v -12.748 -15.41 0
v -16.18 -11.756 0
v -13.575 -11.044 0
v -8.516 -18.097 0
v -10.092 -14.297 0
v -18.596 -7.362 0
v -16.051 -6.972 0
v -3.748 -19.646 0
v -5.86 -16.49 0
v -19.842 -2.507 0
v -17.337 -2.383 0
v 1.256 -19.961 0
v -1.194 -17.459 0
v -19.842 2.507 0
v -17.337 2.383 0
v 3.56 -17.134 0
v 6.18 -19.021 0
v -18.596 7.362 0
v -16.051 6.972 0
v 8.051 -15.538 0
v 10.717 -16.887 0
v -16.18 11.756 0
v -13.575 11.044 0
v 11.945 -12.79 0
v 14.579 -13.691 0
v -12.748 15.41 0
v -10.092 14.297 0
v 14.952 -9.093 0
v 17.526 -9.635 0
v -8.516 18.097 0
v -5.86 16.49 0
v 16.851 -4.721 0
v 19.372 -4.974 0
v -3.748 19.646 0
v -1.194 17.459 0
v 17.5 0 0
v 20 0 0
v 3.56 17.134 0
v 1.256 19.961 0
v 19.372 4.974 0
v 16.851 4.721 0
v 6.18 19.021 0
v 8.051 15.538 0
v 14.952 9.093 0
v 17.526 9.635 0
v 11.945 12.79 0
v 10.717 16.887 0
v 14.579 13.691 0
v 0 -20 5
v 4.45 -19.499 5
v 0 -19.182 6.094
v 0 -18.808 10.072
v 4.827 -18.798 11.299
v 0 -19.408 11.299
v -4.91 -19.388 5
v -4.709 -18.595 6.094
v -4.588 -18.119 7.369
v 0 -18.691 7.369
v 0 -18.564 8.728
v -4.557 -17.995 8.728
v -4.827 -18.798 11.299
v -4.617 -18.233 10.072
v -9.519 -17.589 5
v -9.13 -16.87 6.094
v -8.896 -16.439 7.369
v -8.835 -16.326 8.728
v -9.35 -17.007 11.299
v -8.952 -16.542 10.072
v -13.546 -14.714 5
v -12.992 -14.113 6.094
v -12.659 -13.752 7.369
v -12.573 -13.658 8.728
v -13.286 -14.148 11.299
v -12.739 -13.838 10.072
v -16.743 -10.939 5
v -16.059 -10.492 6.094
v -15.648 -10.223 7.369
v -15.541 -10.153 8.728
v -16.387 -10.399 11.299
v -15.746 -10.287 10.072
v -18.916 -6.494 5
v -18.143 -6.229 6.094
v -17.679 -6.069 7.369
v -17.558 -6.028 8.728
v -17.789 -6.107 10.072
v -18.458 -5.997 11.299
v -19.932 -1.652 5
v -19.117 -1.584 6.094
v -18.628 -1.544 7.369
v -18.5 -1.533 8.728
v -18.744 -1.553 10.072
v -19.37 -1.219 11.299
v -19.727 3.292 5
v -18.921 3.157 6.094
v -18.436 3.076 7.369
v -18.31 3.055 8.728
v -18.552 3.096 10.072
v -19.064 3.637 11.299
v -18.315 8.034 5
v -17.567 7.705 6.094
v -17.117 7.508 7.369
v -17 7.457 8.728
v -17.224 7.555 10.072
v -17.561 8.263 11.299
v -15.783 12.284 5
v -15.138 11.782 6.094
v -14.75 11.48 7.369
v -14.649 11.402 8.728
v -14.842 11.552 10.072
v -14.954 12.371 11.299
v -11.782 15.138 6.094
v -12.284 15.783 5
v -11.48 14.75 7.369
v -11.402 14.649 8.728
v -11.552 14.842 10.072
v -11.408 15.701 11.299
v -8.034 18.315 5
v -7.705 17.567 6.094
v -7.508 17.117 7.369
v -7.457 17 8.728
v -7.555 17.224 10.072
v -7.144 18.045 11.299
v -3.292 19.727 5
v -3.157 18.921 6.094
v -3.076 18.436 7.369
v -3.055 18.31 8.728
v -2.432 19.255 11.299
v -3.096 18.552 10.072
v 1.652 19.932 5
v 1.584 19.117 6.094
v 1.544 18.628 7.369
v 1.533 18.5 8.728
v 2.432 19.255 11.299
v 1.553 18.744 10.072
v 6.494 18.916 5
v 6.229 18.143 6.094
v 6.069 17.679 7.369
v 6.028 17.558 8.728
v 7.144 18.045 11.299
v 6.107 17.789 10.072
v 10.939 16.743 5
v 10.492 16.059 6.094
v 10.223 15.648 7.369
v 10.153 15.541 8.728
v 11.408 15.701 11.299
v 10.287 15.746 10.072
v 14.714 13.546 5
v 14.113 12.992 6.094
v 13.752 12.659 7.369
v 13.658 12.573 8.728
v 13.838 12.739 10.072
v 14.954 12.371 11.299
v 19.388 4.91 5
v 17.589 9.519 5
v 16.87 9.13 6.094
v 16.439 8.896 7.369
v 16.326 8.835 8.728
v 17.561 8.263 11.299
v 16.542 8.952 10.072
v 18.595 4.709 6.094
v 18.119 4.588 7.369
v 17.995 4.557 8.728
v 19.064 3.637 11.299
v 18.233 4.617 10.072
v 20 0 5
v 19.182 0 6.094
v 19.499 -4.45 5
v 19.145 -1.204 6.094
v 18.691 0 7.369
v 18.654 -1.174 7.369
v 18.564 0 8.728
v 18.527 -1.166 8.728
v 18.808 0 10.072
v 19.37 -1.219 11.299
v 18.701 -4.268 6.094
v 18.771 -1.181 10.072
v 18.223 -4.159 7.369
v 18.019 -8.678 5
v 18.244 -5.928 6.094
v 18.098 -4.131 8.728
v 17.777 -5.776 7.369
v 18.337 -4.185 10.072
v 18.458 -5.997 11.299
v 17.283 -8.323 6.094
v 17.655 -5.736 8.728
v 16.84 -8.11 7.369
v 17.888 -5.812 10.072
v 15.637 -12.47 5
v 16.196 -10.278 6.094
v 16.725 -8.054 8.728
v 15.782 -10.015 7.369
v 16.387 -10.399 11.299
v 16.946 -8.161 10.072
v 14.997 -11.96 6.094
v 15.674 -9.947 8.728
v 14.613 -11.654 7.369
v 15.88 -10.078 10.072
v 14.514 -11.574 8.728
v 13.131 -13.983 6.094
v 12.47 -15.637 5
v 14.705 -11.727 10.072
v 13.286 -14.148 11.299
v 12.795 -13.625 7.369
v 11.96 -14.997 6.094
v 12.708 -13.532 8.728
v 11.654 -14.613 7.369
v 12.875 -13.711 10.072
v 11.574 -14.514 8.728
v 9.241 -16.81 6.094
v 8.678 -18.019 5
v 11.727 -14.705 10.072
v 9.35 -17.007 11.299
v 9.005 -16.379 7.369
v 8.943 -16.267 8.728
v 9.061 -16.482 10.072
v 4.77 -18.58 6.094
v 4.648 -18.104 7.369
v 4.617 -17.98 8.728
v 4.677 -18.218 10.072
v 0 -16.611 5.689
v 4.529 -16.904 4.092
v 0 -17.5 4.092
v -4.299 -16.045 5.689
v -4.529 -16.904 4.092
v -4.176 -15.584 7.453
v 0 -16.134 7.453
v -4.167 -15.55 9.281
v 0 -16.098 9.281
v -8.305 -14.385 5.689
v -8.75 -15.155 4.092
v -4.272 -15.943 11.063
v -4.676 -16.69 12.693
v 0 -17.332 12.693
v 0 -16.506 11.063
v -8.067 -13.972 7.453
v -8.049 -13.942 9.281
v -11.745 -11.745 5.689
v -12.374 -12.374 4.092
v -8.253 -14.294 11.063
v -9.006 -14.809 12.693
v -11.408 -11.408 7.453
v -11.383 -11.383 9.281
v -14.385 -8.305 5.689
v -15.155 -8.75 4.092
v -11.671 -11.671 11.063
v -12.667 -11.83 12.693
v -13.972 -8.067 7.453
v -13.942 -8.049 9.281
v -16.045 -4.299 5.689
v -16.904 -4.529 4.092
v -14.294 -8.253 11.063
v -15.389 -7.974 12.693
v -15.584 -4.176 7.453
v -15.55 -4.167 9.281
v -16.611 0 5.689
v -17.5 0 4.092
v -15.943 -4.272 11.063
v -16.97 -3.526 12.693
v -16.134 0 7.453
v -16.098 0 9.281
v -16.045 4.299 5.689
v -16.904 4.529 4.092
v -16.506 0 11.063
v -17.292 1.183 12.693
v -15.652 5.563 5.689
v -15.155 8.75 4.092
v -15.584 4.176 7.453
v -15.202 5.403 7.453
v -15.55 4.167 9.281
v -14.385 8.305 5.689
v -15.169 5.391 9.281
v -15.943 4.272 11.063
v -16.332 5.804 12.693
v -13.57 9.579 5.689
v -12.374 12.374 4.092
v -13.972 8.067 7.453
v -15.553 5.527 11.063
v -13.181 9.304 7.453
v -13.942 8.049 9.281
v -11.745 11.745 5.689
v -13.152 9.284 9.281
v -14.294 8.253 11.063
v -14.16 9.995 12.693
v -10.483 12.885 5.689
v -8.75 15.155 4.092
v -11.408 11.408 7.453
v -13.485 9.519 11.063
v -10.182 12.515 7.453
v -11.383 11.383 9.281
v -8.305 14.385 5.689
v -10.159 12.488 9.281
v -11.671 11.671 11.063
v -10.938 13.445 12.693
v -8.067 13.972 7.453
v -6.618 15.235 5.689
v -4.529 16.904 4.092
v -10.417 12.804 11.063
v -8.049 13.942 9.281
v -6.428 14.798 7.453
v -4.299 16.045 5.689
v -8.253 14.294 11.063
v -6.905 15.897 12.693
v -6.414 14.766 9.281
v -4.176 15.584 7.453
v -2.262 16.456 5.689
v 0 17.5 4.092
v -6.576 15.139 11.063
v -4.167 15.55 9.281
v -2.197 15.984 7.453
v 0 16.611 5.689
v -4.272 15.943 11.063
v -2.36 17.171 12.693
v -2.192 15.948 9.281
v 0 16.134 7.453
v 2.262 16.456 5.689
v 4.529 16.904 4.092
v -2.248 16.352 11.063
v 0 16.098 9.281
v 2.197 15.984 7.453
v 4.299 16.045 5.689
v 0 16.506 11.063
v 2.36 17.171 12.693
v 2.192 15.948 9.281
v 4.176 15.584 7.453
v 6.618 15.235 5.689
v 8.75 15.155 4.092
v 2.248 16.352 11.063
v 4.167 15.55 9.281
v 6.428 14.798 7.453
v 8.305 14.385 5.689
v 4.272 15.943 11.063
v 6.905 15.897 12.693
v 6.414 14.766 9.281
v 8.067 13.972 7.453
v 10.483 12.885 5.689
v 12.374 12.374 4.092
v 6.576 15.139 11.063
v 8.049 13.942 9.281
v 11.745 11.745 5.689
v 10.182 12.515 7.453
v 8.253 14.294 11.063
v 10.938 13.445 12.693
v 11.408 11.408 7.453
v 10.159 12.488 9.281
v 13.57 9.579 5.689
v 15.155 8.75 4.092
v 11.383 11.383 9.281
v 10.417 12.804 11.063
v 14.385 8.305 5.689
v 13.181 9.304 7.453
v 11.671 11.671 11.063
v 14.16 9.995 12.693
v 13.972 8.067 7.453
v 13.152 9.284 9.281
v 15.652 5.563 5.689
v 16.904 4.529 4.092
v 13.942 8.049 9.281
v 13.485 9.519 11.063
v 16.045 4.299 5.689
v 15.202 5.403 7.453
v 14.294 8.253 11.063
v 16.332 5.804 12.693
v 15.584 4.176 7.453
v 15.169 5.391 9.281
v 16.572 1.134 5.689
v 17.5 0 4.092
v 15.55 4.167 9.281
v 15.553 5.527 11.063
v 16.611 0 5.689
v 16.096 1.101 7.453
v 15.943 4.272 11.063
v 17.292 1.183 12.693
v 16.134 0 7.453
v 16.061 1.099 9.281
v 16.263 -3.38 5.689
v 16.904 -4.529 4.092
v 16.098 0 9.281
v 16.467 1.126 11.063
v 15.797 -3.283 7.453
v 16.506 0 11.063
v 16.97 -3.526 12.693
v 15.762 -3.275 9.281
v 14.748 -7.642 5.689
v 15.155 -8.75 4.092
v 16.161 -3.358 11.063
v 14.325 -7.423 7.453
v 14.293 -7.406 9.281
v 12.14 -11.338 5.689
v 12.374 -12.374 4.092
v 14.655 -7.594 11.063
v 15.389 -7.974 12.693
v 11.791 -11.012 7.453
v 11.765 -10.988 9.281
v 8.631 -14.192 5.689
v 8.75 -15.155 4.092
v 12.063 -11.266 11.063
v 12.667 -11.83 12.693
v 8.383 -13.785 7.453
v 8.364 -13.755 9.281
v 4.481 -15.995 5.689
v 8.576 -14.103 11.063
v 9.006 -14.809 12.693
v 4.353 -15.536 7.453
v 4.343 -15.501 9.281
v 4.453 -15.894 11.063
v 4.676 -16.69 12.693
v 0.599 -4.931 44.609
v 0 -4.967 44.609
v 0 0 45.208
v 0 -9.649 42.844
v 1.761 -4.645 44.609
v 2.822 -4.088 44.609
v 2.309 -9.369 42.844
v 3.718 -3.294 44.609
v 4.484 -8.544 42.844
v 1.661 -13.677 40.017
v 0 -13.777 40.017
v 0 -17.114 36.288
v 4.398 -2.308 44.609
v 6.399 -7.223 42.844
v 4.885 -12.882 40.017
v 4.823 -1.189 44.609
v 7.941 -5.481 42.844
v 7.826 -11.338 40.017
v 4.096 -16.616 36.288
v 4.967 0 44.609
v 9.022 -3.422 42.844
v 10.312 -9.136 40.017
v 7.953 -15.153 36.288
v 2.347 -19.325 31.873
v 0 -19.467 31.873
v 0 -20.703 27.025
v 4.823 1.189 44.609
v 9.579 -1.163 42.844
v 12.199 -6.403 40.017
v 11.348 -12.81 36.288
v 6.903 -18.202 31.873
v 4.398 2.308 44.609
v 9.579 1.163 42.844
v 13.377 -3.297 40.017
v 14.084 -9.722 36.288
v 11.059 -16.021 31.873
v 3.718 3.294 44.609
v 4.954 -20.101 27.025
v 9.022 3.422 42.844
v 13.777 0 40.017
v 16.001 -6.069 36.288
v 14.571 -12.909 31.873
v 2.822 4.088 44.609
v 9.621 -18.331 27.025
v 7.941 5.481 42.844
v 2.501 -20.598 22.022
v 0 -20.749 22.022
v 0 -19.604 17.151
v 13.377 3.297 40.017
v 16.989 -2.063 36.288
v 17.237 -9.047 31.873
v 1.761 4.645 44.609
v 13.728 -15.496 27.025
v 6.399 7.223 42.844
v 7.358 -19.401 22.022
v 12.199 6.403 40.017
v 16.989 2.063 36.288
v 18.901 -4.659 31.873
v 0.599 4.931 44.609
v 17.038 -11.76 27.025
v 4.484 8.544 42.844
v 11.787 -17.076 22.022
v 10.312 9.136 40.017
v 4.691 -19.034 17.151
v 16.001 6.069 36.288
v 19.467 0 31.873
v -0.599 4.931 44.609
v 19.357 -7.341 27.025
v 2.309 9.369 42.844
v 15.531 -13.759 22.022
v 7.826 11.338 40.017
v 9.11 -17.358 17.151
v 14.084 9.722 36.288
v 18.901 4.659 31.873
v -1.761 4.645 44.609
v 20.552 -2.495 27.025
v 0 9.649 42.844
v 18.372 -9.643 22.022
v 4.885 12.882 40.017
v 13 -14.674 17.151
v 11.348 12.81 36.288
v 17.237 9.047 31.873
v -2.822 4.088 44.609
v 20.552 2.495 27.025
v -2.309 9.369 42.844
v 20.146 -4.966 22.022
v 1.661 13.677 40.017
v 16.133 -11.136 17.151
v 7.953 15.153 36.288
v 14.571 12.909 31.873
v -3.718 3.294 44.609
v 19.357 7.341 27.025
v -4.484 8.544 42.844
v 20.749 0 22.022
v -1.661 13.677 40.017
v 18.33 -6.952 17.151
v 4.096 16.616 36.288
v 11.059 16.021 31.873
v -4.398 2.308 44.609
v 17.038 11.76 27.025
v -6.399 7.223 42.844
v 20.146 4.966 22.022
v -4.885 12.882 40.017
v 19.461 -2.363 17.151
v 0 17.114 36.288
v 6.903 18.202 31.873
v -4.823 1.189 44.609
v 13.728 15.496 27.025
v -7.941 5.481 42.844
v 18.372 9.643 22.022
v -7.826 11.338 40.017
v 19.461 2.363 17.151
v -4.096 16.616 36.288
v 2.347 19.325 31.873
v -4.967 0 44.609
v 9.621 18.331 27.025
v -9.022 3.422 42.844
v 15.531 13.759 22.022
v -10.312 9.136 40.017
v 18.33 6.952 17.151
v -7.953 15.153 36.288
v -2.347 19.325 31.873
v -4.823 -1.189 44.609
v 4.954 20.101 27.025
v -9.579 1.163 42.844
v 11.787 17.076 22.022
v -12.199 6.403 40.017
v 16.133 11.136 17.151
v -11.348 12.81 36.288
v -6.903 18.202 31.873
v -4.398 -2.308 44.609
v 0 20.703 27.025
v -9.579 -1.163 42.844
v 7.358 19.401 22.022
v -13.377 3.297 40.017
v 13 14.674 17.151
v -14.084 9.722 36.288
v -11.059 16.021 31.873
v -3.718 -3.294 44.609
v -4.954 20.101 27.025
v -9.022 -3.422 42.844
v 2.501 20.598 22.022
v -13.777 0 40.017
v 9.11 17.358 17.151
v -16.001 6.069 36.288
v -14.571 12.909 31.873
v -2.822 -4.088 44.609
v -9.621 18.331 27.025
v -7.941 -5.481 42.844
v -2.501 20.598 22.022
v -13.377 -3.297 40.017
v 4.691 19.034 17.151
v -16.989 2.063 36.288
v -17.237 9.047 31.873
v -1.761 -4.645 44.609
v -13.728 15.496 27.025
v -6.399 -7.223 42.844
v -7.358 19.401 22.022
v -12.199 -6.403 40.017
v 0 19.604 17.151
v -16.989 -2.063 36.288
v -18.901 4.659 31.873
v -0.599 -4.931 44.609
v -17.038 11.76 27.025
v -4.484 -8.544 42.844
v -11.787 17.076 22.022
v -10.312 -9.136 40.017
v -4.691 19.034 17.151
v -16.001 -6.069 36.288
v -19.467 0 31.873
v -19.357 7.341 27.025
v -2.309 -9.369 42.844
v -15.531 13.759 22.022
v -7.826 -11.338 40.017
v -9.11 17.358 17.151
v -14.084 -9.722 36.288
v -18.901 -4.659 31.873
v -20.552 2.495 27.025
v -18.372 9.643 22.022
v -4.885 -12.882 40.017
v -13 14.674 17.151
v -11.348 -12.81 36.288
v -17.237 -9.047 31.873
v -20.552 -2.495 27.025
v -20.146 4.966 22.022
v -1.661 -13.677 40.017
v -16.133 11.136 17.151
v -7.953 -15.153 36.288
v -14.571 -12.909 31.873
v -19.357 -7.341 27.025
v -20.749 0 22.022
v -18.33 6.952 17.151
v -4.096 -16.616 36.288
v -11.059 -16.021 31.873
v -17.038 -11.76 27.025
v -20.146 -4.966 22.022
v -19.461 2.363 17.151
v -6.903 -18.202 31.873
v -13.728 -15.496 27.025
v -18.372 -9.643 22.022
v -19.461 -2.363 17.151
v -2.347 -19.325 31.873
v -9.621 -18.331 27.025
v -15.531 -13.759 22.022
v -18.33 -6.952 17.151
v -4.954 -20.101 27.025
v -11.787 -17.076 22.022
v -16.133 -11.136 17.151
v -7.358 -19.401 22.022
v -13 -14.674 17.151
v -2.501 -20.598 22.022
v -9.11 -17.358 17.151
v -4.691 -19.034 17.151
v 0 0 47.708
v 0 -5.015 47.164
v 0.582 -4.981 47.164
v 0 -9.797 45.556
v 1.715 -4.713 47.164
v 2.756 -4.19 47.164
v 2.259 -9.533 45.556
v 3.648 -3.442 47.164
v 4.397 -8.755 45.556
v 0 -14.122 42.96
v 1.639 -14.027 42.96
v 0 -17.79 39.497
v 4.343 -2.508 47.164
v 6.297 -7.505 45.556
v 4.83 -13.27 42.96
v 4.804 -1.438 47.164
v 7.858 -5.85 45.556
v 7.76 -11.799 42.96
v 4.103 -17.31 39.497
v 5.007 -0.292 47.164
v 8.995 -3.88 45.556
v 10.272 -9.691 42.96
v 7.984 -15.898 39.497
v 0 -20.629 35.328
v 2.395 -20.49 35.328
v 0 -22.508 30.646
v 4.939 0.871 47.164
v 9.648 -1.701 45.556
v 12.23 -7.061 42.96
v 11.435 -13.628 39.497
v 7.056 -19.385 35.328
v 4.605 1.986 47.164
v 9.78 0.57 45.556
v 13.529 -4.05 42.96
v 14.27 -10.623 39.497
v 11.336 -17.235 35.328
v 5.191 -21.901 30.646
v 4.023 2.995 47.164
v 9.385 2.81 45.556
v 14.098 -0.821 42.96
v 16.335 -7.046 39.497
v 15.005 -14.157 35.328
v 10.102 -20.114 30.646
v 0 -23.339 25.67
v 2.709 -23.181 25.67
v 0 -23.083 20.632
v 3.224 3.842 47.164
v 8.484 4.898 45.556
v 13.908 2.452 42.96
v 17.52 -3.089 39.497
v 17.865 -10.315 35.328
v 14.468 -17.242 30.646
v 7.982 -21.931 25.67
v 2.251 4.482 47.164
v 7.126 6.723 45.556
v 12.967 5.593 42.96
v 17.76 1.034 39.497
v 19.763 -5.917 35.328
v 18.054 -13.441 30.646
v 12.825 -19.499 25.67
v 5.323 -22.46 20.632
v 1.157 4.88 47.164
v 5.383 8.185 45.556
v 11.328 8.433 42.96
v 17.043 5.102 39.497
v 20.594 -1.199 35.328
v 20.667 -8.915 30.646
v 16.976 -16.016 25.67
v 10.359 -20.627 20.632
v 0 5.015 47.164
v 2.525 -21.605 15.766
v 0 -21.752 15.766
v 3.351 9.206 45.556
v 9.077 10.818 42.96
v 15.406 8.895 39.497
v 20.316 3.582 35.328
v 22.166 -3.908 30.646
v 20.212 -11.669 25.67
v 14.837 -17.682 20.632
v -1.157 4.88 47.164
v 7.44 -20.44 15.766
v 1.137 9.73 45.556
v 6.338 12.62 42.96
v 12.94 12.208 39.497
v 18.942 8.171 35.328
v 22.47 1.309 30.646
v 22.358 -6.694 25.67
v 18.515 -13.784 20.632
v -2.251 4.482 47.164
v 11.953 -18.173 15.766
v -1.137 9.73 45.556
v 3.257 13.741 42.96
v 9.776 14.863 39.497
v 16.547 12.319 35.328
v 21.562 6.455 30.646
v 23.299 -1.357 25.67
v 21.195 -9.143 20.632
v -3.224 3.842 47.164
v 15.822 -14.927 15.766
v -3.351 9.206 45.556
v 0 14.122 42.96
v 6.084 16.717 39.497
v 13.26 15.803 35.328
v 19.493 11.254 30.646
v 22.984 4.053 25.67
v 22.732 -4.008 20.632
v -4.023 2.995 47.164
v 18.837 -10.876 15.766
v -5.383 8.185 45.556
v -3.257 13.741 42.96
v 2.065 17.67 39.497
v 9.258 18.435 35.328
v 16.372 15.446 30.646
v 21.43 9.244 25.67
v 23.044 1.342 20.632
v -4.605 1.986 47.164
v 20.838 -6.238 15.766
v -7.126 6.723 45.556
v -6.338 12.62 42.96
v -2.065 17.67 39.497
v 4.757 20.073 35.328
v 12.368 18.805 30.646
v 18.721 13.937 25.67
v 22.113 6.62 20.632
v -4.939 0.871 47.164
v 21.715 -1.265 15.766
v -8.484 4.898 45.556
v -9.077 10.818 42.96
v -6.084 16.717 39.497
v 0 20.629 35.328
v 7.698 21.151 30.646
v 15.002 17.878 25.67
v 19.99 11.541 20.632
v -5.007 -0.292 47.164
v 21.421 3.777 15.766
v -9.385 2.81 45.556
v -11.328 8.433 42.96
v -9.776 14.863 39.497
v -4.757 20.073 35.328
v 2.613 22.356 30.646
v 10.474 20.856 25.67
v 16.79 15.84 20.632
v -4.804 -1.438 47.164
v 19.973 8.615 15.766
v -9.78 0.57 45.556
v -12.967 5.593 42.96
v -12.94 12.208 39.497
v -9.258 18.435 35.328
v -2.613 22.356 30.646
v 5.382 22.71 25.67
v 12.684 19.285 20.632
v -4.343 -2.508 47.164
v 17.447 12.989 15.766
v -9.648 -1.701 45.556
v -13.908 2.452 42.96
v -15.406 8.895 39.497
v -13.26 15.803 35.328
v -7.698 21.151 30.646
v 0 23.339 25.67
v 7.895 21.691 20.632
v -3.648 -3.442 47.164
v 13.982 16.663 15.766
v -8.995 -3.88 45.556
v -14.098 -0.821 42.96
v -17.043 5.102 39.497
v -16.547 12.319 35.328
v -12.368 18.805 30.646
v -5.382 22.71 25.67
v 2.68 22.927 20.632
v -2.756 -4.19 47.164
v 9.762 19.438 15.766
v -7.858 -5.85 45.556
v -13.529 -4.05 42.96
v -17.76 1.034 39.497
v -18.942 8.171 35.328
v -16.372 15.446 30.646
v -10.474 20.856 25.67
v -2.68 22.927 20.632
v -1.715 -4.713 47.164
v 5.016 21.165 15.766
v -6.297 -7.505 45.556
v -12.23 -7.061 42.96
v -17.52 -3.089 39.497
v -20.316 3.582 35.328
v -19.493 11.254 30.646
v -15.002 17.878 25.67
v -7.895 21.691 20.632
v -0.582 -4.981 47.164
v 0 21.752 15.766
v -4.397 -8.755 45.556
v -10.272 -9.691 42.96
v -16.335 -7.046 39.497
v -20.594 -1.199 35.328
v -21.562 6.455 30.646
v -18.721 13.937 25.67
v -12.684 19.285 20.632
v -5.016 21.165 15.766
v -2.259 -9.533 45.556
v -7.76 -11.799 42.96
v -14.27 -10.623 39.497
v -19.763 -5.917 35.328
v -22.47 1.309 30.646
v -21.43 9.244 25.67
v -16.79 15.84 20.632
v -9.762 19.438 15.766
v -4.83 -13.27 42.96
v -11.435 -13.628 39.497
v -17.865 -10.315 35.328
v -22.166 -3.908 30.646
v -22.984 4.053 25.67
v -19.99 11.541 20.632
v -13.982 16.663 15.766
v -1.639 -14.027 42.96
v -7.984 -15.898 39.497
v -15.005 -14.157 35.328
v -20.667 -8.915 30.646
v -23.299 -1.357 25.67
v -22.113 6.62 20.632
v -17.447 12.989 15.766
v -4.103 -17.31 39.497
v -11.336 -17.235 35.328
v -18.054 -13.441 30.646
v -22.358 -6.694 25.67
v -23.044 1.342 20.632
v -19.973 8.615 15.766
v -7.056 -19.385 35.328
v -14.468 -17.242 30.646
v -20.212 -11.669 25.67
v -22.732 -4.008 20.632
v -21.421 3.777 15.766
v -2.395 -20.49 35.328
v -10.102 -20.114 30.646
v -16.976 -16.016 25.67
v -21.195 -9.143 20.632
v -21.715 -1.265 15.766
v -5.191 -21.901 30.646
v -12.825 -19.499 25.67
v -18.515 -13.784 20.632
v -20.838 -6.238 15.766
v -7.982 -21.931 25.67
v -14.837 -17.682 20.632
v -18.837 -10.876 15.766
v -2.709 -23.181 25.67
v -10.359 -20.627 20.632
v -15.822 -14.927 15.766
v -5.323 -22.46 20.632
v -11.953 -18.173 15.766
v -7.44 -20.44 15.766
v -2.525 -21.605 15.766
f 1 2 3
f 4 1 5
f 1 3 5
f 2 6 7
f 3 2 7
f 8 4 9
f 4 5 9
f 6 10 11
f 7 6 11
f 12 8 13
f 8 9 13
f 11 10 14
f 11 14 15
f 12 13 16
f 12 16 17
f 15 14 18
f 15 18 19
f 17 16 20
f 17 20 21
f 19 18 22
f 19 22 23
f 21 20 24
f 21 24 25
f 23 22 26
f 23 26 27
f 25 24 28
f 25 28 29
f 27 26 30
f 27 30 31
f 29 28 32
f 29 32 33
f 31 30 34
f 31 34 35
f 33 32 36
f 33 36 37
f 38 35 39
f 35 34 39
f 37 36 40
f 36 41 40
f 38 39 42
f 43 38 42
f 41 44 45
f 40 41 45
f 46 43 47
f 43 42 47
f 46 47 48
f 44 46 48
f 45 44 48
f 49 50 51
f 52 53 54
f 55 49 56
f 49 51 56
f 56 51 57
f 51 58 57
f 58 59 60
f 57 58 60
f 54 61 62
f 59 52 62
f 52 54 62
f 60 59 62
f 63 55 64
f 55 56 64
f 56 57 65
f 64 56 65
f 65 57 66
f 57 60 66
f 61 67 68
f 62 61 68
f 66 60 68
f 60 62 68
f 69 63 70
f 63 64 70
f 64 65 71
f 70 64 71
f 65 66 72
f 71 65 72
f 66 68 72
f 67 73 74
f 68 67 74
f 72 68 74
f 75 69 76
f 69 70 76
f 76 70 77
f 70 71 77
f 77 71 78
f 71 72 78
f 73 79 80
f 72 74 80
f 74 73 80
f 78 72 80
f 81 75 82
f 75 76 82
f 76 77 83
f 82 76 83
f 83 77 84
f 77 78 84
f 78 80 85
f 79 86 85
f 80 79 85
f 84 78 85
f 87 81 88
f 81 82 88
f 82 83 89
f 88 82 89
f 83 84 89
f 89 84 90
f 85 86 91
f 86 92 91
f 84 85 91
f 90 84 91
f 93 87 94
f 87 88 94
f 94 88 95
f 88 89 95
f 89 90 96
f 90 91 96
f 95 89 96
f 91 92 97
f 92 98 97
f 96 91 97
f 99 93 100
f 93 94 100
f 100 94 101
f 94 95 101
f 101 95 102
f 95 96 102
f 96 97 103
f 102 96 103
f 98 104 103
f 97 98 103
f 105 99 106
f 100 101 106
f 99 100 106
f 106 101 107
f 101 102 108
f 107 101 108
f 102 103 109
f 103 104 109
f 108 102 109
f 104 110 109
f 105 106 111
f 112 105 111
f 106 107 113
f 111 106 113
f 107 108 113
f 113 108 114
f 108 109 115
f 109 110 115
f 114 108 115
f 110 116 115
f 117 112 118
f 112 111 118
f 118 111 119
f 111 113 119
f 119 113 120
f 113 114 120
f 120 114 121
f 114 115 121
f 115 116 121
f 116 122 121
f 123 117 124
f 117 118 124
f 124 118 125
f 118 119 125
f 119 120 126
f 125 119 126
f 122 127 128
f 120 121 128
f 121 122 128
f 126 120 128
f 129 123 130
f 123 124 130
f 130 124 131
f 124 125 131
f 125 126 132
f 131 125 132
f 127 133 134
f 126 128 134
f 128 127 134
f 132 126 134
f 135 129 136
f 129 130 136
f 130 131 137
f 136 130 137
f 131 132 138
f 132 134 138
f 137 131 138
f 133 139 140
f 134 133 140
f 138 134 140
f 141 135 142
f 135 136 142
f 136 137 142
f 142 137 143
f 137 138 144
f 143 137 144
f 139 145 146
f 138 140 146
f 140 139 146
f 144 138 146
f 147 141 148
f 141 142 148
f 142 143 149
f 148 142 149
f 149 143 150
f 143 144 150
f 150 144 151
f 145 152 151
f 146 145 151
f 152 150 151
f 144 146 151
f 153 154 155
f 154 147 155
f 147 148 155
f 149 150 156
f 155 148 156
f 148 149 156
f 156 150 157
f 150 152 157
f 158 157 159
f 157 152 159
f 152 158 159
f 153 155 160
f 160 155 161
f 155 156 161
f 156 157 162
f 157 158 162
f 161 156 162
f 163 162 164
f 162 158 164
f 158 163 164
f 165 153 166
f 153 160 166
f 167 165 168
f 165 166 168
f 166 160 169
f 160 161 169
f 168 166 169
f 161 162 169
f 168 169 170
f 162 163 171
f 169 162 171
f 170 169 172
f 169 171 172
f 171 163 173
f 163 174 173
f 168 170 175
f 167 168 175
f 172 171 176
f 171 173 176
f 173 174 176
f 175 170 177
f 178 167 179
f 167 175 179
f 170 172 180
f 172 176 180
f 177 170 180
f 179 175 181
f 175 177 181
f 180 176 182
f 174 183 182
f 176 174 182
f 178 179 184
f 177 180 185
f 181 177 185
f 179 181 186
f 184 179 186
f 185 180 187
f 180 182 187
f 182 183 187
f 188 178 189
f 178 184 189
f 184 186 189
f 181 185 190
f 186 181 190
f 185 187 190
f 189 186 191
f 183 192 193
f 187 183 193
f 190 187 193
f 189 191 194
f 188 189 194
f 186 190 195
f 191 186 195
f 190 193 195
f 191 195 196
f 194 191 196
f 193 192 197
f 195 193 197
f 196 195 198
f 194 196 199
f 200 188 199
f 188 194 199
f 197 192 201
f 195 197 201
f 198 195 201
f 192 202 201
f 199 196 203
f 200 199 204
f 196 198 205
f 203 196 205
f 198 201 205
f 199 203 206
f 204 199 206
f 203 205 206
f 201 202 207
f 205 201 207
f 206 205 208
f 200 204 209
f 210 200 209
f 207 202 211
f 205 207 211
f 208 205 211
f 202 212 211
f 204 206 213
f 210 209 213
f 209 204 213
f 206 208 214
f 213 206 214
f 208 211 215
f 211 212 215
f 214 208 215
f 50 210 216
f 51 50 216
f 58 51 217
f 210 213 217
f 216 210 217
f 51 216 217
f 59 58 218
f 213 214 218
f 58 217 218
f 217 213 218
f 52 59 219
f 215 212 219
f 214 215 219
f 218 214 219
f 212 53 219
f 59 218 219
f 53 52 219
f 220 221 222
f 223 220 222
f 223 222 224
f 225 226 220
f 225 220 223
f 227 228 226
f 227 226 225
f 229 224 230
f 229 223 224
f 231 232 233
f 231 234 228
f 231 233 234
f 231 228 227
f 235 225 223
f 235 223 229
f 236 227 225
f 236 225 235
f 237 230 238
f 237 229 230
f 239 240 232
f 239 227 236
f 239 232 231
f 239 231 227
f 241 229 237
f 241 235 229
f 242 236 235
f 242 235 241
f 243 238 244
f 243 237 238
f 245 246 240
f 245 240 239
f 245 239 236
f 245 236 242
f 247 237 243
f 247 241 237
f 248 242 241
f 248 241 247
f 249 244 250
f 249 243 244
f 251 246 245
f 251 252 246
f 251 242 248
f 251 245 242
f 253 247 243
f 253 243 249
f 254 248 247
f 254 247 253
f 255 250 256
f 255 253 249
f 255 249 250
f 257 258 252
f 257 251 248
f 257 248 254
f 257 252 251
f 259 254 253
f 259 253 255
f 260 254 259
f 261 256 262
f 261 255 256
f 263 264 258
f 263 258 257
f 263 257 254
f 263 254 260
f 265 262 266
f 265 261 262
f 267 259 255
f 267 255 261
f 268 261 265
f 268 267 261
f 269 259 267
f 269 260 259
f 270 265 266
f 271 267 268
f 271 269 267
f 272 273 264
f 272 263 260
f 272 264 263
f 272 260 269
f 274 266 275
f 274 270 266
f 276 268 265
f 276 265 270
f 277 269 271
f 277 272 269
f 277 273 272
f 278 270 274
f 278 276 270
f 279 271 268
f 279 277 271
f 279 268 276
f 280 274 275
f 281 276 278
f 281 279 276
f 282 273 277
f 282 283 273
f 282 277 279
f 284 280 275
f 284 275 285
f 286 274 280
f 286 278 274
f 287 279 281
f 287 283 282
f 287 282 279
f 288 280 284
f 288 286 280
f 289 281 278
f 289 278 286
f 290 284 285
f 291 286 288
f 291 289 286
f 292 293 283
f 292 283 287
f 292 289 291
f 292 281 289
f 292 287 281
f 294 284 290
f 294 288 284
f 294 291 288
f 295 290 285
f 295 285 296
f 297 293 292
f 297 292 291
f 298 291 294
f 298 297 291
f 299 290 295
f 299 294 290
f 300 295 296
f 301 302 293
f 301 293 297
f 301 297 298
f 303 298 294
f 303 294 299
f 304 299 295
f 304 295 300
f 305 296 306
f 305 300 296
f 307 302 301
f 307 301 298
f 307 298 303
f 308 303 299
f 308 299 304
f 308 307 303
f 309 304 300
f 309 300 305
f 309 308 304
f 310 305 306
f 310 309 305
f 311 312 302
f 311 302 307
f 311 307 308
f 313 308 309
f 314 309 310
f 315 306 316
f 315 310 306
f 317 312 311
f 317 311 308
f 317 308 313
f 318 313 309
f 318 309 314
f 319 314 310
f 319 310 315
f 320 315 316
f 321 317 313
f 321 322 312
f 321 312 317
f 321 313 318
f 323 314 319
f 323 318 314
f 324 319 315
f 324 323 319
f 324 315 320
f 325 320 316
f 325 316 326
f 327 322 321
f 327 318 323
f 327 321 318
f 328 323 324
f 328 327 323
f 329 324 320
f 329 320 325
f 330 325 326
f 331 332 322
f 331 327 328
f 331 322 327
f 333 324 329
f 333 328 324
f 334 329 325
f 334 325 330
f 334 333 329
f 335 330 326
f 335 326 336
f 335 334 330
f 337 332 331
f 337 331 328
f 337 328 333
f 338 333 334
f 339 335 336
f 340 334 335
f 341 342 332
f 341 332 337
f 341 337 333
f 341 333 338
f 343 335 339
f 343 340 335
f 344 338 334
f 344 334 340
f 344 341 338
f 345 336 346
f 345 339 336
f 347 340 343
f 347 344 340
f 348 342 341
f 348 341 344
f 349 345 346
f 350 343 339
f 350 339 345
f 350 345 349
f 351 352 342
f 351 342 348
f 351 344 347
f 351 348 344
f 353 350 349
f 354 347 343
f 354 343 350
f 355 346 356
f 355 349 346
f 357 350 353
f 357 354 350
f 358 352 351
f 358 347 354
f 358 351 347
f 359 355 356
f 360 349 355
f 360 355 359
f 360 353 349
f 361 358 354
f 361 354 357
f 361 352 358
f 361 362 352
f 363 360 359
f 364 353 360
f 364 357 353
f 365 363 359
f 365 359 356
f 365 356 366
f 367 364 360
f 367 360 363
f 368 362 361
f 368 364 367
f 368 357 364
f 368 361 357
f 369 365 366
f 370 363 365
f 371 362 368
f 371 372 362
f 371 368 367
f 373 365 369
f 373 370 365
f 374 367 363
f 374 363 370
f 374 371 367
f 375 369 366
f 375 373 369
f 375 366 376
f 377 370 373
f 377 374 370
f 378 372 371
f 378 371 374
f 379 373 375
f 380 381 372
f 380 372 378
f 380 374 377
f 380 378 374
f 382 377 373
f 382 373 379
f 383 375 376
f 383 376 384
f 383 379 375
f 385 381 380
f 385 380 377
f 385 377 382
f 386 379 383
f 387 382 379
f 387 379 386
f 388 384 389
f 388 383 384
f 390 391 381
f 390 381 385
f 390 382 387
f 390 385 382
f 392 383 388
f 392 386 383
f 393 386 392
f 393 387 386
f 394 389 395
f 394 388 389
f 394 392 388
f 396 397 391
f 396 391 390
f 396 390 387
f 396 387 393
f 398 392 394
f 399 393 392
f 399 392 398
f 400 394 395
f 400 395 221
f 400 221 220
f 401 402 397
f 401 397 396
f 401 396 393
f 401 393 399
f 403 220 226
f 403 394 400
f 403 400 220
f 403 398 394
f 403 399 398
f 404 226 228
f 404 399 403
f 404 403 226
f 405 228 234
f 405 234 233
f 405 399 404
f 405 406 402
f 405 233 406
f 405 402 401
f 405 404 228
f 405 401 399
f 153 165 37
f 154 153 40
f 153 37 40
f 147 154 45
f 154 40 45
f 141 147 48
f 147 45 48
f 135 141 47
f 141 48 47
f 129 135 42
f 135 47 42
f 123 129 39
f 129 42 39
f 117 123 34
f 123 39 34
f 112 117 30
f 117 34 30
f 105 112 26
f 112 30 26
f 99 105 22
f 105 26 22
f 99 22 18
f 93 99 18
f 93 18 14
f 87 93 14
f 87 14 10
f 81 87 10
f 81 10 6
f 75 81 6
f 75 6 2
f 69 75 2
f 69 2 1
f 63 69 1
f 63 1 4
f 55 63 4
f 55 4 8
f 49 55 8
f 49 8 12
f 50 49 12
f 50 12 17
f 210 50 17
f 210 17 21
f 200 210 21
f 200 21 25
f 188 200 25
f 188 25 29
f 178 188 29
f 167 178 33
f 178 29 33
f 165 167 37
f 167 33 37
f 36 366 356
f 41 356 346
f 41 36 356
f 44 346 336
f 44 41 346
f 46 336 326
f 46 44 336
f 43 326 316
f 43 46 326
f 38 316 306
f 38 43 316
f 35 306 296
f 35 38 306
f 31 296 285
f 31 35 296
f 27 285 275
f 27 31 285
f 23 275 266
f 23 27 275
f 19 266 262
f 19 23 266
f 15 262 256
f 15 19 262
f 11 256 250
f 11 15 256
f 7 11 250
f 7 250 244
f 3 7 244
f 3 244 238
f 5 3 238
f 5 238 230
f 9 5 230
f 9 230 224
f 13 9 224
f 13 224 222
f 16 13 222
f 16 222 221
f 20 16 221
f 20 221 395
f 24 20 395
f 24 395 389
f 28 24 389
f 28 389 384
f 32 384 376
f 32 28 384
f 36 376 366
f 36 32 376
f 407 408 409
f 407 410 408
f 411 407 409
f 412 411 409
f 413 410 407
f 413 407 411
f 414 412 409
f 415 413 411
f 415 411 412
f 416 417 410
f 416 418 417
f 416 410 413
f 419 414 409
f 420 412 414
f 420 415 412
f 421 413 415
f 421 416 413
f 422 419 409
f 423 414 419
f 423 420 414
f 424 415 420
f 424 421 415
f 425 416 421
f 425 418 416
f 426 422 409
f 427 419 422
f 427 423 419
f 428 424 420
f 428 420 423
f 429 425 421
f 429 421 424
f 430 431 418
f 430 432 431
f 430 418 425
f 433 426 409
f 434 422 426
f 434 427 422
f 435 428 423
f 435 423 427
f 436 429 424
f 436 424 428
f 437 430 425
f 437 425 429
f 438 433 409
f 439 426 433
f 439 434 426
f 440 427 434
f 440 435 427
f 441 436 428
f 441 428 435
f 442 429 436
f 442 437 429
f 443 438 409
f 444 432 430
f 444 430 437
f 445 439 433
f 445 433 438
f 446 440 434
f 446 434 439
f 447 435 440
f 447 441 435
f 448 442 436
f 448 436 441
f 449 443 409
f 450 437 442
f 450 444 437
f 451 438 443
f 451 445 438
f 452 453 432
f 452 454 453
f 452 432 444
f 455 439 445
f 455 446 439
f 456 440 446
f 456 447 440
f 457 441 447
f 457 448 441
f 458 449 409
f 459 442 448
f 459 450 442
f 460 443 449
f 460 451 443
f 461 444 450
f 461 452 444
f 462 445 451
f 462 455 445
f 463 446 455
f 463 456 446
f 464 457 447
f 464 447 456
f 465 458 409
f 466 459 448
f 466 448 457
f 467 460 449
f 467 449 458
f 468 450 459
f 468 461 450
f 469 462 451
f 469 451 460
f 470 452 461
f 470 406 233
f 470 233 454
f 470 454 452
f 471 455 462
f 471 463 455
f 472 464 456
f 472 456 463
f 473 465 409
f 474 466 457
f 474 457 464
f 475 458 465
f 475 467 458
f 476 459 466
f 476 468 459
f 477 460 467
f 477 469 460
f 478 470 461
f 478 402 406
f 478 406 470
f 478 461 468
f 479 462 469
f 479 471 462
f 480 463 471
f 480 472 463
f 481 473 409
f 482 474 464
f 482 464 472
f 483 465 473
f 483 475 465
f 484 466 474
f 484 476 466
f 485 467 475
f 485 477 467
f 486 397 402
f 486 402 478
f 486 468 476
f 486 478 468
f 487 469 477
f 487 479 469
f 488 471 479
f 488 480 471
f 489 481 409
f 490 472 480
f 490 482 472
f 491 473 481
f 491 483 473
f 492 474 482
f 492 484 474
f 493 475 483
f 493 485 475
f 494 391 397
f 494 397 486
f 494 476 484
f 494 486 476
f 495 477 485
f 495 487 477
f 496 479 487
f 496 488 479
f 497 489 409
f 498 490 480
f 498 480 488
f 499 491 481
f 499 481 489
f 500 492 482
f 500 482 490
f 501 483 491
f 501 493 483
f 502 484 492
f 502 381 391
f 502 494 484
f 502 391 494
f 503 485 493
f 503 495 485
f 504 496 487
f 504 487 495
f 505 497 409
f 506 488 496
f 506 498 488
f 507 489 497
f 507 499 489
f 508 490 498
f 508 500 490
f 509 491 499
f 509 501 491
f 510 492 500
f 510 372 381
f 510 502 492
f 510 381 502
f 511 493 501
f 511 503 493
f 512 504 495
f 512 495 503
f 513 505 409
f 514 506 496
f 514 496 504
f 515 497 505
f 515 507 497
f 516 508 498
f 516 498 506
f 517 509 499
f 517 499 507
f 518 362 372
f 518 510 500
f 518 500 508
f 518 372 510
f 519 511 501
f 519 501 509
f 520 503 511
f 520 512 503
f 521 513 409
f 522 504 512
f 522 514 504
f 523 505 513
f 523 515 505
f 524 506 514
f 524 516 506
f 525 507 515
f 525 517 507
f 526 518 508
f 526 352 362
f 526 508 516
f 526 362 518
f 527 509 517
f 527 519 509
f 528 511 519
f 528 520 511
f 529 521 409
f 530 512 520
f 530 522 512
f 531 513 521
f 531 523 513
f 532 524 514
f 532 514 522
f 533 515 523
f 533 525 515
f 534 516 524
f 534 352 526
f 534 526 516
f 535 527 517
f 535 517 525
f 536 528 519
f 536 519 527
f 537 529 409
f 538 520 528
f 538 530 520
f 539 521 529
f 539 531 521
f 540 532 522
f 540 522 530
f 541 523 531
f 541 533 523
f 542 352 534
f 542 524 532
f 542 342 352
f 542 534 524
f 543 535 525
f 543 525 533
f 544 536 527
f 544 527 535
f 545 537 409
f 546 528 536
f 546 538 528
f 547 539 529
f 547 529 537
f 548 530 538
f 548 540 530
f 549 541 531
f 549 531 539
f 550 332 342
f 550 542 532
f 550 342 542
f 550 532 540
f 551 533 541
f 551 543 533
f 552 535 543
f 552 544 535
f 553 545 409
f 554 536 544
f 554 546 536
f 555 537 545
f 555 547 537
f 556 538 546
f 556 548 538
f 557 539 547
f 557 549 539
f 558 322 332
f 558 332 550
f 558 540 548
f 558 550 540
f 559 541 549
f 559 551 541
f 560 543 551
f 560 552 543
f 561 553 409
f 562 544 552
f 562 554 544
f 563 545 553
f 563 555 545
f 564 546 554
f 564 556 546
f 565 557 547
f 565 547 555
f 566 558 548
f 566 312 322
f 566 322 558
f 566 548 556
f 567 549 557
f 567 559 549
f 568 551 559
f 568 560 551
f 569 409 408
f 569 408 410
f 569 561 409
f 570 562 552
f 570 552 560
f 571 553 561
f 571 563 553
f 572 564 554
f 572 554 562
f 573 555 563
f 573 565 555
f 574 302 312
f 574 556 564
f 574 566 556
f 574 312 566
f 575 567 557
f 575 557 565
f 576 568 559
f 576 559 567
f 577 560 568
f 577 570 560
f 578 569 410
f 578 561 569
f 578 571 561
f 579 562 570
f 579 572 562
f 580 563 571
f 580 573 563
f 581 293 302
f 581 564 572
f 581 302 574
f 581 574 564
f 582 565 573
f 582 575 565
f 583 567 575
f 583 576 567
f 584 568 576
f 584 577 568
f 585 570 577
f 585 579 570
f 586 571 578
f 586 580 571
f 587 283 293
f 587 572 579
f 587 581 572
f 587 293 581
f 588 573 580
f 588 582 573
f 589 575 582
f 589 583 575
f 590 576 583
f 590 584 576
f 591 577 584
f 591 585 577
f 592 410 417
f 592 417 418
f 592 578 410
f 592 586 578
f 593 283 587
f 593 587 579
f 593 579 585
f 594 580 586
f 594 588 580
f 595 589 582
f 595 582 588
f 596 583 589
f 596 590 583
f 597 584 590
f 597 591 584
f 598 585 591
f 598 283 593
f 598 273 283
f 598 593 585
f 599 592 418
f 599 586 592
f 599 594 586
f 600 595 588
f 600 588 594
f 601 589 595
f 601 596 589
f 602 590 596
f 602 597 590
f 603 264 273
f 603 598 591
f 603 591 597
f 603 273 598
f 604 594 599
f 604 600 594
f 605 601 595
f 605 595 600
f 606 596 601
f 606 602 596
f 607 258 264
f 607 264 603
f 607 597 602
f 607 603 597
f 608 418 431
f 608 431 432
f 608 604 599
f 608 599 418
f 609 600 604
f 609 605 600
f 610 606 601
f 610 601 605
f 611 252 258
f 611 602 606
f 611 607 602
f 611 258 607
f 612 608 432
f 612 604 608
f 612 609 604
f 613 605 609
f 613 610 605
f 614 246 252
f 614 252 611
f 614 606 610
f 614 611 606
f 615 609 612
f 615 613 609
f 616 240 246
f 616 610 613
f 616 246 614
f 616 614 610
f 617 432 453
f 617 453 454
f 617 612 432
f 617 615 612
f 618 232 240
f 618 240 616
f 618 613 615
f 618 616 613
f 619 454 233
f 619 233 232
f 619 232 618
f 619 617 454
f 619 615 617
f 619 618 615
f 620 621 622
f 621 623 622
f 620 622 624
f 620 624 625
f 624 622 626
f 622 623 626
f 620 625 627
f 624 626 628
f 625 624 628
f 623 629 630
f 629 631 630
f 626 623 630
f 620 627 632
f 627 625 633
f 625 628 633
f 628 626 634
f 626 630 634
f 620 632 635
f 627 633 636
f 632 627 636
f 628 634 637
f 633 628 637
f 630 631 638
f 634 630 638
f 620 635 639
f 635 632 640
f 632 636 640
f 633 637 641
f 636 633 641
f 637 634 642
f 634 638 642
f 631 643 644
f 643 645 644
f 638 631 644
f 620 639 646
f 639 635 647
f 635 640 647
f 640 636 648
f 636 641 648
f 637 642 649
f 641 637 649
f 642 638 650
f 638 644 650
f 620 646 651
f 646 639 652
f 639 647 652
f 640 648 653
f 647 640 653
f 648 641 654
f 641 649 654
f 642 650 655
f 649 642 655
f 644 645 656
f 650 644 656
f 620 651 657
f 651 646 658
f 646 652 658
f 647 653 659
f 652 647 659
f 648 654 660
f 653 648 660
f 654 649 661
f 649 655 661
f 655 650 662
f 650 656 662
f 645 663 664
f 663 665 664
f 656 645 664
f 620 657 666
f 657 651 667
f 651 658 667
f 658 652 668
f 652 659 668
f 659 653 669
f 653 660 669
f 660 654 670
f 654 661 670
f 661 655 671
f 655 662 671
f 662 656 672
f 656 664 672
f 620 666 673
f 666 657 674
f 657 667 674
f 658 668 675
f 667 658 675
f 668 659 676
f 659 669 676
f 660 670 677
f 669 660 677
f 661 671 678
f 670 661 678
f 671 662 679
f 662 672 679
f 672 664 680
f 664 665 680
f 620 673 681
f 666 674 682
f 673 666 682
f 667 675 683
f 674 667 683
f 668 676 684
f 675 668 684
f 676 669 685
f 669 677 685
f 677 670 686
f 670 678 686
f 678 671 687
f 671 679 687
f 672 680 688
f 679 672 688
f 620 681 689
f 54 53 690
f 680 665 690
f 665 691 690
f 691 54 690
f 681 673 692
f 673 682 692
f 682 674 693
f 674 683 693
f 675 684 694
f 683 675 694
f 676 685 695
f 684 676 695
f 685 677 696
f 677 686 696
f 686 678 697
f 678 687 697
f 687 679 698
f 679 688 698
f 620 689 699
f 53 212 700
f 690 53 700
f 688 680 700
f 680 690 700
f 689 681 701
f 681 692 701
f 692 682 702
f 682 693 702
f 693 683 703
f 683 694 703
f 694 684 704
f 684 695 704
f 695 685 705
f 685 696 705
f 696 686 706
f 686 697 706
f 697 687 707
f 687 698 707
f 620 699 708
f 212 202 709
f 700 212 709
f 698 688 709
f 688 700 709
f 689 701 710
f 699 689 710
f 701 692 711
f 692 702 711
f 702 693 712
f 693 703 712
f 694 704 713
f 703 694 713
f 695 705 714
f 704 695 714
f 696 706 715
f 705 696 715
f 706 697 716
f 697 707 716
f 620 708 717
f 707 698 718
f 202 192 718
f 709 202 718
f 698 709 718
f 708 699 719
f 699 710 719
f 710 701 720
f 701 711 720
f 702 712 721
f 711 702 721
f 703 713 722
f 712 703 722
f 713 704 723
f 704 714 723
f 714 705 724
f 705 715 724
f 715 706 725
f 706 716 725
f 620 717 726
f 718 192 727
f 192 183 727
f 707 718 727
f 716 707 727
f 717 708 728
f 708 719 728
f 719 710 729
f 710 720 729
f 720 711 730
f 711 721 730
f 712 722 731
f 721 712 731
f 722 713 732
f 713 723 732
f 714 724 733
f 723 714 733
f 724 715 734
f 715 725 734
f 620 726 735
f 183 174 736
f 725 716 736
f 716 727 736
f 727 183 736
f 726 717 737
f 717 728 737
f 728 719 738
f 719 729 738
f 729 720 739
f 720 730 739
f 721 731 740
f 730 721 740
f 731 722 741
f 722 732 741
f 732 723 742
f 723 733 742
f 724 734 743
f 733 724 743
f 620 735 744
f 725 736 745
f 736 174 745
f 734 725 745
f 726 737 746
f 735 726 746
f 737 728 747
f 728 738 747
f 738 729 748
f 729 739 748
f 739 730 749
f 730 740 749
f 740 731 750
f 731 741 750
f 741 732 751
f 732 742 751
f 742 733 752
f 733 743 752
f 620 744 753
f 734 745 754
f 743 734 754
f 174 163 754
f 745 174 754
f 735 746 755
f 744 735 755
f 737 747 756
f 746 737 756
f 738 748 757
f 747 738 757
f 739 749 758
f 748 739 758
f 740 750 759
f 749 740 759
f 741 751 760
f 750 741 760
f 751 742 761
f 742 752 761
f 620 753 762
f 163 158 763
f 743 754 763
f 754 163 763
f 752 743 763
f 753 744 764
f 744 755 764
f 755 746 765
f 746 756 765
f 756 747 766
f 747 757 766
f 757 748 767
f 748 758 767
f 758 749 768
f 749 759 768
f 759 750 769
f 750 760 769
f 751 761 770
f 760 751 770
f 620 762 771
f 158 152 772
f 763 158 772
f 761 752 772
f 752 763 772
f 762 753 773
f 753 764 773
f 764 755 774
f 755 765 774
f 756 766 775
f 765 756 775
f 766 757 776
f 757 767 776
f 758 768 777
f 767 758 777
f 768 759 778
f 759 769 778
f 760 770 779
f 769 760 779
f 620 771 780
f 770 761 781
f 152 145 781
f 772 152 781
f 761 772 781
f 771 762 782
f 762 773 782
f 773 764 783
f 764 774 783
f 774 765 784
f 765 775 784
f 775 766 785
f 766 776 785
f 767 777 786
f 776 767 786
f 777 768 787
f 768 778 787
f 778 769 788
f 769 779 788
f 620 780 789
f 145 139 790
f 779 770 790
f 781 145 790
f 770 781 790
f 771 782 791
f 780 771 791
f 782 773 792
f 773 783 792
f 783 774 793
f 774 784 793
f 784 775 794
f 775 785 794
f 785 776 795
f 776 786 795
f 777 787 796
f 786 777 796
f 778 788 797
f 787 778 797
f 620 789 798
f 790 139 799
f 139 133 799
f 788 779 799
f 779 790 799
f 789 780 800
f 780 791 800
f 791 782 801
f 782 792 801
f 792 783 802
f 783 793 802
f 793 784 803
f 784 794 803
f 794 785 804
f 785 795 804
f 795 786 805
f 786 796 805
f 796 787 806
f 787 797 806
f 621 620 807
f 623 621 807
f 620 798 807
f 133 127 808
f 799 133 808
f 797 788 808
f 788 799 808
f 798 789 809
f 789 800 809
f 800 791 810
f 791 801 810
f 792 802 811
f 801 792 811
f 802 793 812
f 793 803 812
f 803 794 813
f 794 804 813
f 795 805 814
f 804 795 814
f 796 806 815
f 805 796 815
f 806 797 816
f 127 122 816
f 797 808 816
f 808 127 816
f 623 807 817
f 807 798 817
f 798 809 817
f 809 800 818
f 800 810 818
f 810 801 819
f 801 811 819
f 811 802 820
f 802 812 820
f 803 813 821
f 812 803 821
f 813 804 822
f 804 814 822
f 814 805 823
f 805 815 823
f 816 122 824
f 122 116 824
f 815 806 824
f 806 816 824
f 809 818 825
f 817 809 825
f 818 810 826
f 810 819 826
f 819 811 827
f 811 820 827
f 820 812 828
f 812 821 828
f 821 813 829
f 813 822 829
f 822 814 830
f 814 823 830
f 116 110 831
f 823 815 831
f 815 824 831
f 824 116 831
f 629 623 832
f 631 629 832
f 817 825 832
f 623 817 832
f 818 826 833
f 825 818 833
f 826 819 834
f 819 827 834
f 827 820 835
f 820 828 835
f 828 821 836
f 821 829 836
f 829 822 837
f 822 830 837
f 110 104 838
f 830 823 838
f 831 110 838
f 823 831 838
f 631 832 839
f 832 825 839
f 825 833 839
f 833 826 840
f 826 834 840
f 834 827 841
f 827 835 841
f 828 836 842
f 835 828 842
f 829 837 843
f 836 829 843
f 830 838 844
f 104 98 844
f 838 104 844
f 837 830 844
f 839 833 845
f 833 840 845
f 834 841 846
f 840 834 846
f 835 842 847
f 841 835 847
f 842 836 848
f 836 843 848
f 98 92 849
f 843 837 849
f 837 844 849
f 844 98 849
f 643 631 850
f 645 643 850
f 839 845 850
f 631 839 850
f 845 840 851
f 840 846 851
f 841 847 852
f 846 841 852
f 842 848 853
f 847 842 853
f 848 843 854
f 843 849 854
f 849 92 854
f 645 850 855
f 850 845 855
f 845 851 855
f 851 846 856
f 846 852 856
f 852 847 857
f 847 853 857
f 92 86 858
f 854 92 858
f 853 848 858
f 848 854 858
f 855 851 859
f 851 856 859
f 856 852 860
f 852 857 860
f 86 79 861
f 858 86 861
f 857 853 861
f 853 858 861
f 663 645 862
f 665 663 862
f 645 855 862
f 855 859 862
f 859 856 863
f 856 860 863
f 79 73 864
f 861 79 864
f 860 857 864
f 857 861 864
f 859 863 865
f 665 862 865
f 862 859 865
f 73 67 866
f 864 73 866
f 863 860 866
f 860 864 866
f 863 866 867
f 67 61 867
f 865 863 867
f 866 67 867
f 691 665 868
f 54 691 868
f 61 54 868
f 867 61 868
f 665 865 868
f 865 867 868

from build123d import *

# Parameters (mm, degrees)
F0_R     = 20
F1_DEPTH = 5
F5_T     = -2.5


# Not quite as in the source:
# - a fillet or chamfer that OpenCascade refuses, or shapes differently, is made with other operations: its cross-section is extruded or revolved along the edge and cut away or added


with BuildPart() as f1:
    # F0 (on Top) → F1 (new body)
    with BuildSketch(Plane.XY):
        Circle(F0_R)
    extrude(amount=F1_DEPTH)

    # F2 (on Right) → F3 (revolve)
    with BuildSketch(Plane.YZ):
        with BuildLine():
            Line((0, 0.953980596), (0, 47.7081678201))
            ThreePointArc((0, 47.7081678201), (-23.377093612, 24.331074208), (0, 0.953980596))
        make_face()
    revolve(axis=Axis((0, 0, 23.85408391), (0, 0, 1)))

    # F4: fillet of radius 5 on 1 edges, made by hand

    # F4_s1 → F4_t2 (revolve)
    with BuildSketch(Plane.YZ):
        with BuildLine():
            ThreePointArc((-20, 5), (-18.5807849657, 8.0440971034), (-19.4078057687, 11.2993597778))
            Line((-19.4078057687, 11.2993597778), (-19.3247851585, 11.3551054348))
            ThreePointArc((-19.3247851585, 11.3551054348), (-16.5075665861, 7.9200007382), (-13.0890367821, 5.0826923763))
            Line((-13.0890367821, 5.0826923763), (-13.1452681871, 4.9))
            ThreePointArc((-13.1452681871, 4.9), (-16.5726340935, 4.9), (-19.9288232744, 4.9297584615))
            Line((-19.9288232744, 4.9297584615), (-20, 5))
        make_face()
    revolve(axis=Axis((0, 0, 5), (0, 0, -1)))

    # F5
    f5_openings = [f1.faces().sort_by_distance(p)[0] for p in [
        (0, 0, 0),
    ]]
    offset(amount=F5_T, openings=f5_openings)


solid = f1.part
